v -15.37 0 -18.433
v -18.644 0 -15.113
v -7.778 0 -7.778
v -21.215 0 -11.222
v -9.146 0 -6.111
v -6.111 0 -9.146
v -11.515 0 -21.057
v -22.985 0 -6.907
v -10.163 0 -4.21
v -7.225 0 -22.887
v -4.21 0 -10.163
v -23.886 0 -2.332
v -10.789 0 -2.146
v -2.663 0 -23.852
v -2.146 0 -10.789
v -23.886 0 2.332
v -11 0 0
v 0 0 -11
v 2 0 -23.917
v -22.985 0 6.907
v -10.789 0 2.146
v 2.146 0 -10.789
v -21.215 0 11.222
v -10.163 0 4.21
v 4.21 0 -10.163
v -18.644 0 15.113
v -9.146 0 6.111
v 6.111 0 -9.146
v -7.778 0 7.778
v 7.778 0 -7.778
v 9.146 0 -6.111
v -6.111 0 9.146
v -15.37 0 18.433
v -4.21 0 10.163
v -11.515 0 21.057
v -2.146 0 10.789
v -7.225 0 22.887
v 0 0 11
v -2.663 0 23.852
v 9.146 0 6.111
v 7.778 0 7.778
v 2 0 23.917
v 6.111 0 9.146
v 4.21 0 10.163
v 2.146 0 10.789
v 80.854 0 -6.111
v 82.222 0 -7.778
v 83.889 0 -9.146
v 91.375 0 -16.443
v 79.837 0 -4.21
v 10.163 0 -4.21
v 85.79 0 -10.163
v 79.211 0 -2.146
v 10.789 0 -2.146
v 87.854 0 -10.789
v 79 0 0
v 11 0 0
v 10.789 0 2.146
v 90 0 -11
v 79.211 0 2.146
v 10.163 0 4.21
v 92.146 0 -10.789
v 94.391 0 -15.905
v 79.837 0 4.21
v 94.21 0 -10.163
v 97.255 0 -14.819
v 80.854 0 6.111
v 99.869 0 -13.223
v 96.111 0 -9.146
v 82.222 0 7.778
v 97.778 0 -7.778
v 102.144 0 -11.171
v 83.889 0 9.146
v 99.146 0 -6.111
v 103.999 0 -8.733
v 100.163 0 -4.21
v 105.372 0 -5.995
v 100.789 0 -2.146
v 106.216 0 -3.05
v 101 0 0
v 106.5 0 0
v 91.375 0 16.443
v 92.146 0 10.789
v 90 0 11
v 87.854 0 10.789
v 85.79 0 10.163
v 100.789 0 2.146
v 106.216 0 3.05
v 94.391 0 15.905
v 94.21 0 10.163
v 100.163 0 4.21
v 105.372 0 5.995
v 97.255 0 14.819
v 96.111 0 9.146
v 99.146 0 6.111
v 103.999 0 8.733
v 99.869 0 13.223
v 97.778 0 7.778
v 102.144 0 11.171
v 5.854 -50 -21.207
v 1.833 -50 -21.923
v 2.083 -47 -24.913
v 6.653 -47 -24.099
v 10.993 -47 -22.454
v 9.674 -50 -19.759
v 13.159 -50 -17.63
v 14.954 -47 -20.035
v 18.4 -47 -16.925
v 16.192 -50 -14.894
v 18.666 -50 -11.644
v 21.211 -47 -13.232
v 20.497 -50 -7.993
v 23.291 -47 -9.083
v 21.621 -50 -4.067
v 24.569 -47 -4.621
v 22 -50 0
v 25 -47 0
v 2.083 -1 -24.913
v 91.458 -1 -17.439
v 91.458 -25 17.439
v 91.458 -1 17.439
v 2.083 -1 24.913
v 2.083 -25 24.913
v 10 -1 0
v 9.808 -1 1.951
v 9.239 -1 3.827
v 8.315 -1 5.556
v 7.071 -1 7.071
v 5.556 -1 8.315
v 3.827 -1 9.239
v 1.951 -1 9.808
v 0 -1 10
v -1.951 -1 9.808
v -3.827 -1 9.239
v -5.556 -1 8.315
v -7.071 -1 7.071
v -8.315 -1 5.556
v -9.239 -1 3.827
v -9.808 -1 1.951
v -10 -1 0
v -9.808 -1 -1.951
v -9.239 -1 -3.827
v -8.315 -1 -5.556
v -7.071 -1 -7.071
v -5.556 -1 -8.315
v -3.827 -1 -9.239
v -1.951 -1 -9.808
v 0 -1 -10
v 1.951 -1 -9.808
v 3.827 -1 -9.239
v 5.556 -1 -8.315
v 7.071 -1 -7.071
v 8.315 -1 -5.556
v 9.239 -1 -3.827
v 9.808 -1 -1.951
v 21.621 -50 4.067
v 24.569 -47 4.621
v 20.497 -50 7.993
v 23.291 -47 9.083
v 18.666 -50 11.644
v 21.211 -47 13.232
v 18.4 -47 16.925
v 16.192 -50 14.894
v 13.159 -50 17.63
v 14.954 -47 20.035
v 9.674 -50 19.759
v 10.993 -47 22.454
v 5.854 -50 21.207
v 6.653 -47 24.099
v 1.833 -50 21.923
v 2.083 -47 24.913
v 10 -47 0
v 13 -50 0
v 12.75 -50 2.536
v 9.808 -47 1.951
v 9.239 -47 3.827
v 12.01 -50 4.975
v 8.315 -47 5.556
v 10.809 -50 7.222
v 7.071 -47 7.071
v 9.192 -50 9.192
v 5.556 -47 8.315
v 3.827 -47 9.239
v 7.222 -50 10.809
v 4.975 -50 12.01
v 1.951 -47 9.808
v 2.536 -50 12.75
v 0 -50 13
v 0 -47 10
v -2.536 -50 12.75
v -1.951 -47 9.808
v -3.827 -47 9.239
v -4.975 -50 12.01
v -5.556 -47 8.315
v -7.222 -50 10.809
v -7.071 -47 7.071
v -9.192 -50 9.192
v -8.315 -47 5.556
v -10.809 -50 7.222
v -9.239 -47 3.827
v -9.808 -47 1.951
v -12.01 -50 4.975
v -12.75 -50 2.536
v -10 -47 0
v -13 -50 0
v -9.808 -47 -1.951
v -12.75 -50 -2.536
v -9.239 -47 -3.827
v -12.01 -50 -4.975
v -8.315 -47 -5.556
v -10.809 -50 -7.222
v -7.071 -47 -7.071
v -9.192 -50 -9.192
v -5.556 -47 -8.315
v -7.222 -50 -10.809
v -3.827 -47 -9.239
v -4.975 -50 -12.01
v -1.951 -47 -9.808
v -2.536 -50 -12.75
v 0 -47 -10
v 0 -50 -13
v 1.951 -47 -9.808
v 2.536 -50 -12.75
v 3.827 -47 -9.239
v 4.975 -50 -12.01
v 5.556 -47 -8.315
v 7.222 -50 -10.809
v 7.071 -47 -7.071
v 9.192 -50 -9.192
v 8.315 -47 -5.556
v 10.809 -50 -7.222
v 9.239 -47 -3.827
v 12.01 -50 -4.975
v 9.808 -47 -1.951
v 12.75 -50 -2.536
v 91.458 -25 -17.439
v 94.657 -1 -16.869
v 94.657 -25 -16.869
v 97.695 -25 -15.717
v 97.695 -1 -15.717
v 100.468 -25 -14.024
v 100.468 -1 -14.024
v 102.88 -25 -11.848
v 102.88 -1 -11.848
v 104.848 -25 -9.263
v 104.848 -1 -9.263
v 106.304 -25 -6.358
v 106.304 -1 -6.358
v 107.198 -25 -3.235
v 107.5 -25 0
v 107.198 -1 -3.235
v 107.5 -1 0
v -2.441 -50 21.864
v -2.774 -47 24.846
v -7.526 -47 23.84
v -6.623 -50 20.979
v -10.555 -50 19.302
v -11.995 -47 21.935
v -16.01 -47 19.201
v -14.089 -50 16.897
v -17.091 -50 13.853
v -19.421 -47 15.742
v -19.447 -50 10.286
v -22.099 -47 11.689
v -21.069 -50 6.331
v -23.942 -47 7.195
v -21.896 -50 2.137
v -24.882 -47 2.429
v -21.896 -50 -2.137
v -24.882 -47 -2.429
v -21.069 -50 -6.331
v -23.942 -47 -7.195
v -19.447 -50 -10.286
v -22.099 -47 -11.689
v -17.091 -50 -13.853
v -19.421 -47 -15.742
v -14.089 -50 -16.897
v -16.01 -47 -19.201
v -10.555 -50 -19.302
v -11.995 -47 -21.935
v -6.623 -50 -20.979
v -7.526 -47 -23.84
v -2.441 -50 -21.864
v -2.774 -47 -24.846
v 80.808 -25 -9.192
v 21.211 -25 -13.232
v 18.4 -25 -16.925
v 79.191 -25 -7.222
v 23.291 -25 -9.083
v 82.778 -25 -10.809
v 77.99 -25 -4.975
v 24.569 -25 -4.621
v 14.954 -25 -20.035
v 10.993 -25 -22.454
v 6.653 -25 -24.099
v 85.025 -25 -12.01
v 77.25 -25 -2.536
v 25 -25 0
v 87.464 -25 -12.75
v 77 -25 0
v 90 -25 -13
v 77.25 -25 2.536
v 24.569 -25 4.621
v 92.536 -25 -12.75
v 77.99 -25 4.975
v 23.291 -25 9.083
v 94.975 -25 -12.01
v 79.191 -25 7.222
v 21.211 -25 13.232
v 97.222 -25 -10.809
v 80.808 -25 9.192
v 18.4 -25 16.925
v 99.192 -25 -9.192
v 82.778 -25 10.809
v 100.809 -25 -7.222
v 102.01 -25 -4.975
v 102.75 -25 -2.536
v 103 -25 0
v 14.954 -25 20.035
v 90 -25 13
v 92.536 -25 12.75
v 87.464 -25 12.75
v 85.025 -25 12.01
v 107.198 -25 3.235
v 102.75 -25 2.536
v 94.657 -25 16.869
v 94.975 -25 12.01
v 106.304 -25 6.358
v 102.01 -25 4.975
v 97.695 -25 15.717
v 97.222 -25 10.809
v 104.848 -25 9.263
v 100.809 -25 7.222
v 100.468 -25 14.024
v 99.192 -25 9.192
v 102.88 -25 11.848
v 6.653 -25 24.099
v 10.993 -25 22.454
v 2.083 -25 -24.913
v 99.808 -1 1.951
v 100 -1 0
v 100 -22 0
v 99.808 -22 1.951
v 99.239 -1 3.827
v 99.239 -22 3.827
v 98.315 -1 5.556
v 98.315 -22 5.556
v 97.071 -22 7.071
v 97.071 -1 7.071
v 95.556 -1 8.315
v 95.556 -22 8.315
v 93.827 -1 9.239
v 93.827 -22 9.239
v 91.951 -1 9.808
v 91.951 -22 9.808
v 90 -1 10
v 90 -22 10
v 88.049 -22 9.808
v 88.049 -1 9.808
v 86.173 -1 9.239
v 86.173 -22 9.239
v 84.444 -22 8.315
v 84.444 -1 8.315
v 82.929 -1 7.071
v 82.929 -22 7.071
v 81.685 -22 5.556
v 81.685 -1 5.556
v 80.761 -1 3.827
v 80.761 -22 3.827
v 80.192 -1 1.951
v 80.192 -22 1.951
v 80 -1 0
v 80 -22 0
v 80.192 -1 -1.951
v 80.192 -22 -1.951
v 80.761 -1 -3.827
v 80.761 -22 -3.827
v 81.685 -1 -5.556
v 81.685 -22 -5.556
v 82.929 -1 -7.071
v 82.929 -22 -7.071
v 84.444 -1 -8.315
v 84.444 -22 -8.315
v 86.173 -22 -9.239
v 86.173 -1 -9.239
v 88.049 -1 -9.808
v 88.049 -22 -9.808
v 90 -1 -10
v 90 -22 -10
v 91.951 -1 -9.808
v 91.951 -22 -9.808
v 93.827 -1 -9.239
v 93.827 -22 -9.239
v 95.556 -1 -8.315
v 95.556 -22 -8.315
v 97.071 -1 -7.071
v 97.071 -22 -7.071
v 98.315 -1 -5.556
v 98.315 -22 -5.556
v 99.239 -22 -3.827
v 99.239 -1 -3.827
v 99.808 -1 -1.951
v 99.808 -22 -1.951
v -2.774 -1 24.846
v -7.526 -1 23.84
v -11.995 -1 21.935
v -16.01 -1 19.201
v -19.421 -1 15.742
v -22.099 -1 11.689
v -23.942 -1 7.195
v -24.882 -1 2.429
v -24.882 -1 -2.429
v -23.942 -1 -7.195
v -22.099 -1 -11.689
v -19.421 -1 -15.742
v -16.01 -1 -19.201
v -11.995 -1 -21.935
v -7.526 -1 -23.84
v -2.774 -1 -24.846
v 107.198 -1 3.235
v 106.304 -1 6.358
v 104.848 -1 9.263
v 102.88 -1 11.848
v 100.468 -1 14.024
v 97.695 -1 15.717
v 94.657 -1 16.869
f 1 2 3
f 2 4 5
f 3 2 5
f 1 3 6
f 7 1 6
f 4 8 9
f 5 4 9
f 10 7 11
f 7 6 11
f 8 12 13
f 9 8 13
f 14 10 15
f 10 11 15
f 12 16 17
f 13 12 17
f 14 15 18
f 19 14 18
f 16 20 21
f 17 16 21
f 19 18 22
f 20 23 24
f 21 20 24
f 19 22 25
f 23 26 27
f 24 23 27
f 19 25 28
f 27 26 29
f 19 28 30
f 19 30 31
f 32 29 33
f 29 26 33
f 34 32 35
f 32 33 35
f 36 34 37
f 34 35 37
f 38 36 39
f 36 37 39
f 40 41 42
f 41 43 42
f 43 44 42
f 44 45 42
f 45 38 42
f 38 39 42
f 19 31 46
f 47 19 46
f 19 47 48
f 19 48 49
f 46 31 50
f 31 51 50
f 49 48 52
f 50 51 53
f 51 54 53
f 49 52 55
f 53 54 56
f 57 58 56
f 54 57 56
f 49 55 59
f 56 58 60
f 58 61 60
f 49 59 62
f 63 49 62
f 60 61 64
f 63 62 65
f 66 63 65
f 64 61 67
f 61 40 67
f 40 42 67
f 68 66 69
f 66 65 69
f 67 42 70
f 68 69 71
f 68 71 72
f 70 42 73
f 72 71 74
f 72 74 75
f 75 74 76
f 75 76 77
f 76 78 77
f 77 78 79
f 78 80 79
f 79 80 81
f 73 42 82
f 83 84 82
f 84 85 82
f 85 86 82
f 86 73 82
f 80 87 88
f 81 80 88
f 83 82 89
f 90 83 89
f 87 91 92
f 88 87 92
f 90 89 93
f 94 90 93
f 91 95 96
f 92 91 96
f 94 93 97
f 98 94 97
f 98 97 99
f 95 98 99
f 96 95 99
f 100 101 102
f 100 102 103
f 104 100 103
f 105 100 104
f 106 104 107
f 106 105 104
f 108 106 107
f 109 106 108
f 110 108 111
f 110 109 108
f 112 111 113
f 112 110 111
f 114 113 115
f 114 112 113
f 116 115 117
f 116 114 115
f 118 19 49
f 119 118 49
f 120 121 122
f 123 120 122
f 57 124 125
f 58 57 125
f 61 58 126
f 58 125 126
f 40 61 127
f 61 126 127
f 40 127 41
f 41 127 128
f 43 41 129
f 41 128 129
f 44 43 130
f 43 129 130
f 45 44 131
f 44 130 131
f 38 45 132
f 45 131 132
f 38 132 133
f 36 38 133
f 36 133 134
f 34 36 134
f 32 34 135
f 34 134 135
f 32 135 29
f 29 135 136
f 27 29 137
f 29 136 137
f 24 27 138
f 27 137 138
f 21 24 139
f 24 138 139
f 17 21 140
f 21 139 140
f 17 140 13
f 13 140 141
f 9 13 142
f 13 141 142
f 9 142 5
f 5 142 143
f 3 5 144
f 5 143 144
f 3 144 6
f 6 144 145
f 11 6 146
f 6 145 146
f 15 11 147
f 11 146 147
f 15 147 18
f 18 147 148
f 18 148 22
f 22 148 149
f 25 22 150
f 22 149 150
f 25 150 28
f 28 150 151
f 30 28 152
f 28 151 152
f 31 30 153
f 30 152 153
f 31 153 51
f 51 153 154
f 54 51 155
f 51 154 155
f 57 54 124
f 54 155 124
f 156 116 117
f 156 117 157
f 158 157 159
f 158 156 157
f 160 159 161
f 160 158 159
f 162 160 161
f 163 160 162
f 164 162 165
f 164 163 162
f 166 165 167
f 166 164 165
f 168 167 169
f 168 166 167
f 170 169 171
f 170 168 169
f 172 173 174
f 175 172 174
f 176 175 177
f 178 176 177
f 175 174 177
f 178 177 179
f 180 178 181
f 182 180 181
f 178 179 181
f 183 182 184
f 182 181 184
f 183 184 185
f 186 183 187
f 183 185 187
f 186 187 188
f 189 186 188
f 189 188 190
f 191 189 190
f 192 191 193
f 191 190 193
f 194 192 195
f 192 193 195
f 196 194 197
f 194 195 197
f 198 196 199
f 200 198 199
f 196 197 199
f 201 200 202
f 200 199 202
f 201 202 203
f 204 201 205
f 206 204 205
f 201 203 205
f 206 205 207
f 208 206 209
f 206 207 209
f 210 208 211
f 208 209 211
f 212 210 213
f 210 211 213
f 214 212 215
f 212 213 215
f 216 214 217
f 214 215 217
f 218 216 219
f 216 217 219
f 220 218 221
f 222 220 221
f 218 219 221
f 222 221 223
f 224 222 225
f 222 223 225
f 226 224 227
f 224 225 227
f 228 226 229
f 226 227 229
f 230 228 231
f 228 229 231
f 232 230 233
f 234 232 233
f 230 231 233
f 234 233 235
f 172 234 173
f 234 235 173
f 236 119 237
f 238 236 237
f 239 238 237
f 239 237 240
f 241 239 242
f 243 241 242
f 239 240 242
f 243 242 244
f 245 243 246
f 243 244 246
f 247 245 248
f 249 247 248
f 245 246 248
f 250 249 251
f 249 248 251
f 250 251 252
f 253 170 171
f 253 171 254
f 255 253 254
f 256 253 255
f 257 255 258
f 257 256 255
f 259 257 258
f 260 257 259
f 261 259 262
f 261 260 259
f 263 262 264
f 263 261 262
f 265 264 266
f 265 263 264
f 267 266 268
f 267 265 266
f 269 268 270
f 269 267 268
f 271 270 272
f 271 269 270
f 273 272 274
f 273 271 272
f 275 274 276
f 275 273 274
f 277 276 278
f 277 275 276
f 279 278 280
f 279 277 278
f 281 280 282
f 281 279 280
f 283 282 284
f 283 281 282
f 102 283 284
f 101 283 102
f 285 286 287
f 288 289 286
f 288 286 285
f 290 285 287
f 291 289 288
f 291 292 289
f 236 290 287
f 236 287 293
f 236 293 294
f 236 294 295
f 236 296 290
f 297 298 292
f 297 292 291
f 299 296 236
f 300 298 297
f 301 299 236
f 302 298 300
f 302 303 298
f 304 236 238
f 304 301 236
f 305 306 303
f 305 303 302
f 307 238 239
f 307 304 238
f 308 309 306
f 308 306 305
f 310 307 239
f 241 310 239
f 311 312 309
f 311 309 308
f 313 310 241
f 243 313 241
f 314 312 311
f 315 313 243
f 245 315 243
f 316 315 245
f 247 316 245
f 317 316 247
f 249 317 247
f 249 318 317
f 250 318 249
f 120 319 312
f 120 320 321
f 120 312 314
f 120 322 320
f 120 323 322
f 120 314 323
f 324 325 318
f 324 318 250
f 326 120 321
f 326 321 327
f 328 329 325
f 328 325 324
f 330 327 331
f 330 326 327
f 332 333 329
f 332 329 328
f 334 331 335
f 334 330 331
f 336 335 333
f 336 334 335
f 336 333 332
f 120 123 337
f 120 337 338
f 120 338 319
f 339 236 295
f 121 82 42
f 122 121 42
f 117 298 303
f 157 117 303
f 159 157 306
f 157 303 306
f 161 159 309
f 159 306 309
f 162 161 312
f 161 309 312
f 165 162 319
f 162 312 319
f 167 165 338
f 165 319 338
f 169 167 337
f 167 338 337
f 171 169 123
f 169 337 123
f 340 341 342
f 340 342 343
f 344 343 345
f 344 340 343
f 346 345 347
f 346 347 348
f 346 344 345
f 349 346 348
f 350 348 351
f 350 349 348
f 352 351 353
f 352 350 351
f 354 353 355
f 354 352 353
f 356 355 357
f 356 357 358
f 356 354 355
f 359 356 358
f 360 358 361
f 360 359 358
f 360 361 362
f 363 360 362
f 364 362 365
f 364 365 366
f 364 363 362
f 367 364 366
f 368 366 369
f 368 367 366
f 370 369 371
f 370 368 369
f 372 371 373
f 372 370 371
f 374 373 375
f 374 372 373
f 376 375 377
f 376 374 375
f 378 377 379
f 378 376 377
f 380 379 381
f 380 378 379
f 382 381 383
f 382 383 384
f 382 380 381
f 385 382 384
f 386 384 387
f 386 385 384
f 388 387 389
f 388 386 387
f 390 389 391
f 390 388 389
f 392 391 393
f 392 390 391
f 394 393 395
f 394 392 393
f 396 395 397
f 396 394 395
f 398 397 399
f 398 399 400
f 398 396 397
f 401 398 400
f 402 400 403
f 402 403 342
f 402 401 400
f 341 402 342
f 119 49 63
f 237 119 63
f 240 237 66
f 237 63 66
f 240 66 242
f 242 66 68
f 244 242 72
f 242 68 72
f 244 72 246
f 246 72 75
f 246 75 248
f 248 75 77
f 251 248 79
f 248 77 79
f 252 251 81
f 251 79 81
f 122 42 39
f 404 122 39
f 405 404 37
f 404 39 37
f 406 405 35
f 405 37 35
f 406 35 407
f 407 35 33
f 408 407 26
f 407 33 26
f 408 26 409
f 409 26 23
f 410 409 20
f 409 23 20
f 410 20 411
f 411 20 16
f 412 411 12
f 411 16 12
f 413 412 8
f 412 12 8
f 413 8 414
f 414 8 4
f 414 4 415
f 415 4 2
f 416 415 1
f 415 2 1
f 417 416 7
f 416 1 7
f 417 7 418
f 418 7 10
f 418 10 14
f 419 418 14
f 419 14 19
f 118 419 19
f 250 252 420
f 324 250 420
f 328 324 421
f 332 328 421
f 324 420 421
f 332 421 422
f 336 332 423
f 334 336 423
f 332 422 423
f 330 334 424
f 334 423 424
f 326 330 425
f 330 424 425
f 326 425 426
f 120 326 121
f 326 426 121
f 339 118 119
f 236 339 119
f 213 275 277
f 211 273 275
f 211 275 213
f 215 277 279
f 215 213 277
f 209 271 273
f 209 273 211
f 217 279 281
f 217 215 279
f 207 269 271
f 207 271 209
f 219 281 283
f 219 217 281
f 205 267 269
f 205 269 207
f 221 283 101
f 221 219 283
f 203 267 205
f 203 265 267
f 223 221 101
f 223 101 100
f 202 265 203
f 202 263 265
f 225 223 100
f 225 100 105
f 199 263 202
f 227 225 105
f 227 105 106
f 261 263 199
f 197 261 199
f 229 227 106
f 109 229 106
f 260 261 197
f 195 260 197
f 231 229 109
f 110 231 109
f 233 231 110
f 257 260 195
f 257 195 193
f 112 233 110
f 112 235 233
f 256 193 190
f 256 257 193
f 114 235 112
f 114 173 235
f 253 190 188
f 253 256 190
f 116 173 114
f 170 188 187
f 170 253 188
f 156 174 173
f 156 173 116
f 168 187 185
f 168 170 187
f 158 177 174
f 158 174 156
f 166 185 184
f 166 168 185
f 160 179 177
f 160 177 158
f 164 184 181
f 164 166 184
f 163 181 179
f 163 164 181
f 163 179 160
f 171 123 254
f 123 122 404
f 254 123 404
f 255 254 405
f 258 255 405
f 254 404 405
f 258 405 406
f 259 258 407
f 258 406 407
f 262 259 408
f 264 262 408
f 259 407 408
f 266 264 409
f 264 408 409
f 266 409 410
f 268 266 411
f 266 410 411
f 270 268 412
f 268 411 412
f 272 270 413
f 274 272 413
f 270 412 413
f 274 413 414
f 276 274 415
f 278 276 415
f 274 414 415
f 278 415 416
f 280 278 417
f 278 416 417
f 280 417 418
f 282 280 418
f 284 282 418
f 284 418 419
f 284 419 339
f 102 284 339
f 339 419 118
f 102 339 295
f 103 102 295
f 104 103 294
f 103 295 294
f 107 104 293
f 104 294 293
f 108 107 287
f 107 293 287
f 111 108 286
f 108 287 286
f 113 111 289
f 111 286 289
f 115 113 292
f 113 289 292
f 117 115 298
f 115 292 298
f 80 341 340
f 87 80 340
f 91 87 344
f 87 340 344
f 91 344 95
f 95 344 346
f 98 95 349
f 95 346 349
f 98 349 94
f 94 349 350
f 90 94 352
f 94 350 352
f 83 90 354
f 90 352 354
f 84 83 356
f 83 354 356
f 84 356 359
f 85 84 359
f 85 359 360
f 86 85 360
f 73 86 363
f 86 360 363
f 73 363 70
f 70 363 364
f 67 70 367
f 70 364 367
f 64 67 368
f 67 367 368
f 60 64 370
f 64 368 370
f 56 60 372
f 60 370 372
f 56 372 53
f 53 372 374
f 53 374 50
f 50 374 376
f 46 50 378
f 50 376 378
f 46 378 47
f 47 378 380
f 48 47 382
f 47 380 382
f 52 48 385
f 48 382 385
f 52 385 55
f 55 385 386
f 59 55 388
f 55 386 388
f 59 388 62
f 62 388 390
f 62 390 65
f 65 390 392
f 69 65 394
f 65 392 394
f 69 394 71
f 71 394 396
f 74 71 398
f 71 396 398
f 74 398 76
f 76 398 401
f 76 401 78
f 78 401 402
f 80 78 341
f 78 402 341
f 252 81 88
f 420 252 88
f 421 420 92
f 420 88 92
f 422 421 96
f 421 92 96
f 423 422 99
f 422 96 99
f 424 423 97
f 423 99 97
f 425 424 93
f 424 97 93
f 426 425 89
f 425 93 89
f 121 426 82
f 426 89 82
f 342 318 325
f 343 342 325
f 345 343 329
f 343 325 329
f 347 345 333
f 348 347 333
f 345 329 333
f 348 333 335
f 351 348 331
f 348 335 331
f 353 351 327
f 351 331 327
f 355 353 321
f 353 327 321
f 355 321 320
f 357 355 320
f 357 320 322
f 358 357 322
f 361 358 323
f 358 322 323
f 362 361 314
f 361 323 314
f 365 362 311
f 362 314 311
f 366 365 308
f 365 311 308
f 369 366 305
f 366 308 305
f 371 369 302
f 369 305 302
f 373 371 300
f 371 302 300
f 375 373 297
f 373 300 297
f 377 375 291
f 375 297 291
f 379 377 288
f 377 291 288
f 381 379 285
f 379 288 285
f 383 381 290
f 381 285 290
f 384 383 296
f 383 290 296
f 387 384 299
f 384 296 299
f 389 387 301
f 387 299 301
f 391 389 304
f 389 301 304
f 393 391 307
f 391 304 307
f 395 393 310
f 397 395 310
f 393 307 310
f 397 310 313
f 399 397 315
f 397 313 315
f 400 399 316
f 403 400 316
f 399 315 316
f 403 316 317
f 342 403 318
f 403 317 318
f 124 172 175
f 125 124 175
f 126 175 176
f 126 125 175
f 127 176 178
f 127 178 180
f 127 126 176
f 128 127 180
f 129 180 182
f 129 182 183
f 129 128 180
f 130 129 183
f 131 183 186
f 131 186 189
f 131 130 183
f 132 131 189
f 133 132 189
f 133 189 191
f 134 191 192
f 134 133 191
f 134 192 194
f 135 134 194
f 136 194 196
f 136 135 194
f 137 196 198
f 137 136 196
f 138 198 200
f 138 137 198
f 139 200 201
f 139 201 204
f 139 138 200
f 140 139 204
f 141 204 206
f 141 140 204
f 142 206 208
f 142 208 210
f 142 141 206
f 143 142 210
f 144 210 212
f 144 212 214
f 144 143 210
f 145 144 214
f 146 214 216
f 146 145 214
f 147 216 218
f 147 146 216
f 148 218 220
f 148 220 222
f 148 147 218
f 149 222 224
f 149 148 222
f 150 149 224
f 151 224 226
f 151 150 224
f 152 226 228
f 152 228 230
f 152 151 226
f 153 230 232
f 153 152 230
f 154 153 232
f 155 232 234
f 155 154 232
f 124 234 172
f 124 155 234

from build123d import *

# Parameters (mm, degrees)
F0_R     = 10
F1_DEPTH = 25
F2_DEPTH = 50
F3_SIZE  = 3
F4_SIZE  = 1


with BuildPart() as f1:
    # F0 (on Front) → F1 (new body)
    with BuildSketch(Plane.XZ):
        with BuildLine():
            ThreePointArc((2.083333, -24.913043), (18.399502, -16.92508), (25, 0))
            ThreePointArc((25, 0), (18.399502, 16.92508), (2.083333, 24.913043))
            ThreePointArc((2.083333, 24.913043), (-25, 0), (2.083333, -24.913043))
        make_face()
        Circle(F0_R, mode=Mode.SUBTRACT)
        with BuildLine():
            ThreePointArc((2.083333, 24.913043), (18.399502, 16.92508), (25, 0))
            ThreePointArc((25, 0), (18.399502, -16.92508), (2.083333, -24.913043))
            Line((2.083333, -24.913043), (91.458333, -17.43913))
            ThreePointArc((91.458333, -17.43913), (72.5, 0), (91.458333, 17.43913))
            Line((91.458333, 17.43913), (2.083333, 24.913043))
        make_face()
        with BuildLine():
            ThreePointArc((107.5, 0), (102.879651, 11.847556), (91.458333, 17.43913))
            ThreePointArc((91.458333, 17.43913), (72.5, 0), (91.458333, -17.43913))
            ThreePointArc((91.458333, -17.43913), (102.879651, -11.847556), (107.5, 0))
        make_face()
        with Locations((90, 0)):
            Circle(F0_R, mode=Mode.SUBTRACT)
    extrude(amount=F1_DEPTH)

    # F0 (on Front) → F2 (join)
    with BuildSketch(Plane.XZ):
        with BuildLine():
            ThreePointArc((2.083333, -24.913043), (18.399502, -16.92508), (25, 0))
            ThreePointArc((25, 0), (18.399502, 16.92508), (2.083333, 24.913043))
            ThreePointArc((2.083333, 24.913043), (-25, 0), (2.083333, -24.913043))
        make_face()
        Circle(F0_R, mode=Mode.SUBTRACT)
    extrude(amount=F2_DEPTH)

    # F3
    f3_edges = [f1.edges().sort_by_distance(p)[0] for p in [
        (-2.083333, -50, 24.913043),
        (-10, -50, 0),
        (80, -25, 0),
    ]]
    chamfer(f3_edges, length=F3_SIZE)

    # F4
    f4_edges = [f1.edges().sort_by_distance(p)[0] for p in [
        (-25, 0, 0),
        (46.770833, 0, -21.176087),
        (107.5, 0, 0),
        (46.770833, 0, 21.176087),
        (-10, 0, 0),
        (80, 0, 0),
    ]]
    chamfer(f4_edges, length=F4_SIZE)


solid = f1.part
